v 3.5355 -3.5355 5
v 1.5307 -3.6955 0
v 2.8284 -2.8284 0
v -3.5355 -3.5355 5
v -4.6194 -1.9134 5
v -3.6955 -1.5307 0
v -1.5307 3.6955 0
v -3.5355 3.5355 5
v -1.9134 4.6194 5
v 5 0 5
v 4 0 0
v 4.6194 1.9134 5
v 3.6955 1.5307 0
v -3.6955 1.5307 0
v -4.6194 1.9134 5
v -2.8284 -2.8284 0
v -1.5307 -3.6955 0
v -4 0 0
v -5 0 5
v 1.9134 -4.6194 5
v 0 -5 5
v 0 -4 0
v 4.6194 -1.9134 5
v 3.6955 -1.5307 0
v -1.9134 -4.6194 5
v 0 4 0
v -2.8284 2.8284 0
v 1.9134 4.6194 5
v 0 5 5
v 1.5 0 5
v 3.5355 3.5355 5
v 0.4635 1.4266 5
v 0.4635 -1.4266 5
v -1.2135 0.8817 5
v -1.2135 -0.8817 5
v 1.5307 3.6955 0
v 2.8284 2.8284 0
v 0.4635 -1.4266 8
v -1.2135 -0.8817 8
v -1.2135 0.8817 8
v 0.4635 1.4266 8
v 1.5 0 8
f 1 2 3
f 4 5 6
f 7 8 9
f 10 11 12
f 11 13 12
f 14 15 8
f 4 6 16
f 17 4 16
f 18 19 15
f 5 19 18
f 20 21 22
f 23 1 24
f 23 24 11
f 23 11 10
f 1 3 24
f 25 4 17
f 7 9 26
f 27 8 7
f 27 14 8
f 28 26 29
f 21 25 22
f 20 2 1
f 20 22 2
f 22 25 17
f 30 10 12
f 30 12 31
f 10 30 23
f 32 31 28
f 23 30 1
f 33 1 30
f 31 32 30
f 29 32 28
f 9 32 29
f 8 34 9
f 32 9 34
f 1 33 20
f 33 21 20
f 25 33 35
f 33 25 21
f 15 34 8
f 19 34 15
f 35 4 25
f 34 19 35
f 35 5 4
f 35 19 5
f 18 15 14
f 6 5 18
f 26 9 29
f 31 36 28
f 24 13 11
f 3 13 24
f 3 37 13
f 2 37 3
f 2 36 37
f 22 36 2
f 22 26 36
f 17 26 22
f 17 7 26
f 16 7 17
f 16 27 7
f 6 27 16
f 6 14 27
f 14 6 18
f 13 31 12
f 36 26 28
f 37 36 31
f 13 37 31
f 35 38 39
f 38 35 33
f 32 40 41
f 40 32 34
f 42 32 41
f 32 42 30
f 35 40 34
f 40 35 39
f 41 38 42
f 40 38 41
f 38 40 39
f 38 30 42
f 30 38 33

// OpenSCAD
Voetje();

module Voetje(hoogte=5) {
 cylinder(d1=hoogte*2-hoogte*2/5,d2=hoogte*2,h=hoogte);
 translate([0,0,5]) cylinder(d=3,h=3);
}
